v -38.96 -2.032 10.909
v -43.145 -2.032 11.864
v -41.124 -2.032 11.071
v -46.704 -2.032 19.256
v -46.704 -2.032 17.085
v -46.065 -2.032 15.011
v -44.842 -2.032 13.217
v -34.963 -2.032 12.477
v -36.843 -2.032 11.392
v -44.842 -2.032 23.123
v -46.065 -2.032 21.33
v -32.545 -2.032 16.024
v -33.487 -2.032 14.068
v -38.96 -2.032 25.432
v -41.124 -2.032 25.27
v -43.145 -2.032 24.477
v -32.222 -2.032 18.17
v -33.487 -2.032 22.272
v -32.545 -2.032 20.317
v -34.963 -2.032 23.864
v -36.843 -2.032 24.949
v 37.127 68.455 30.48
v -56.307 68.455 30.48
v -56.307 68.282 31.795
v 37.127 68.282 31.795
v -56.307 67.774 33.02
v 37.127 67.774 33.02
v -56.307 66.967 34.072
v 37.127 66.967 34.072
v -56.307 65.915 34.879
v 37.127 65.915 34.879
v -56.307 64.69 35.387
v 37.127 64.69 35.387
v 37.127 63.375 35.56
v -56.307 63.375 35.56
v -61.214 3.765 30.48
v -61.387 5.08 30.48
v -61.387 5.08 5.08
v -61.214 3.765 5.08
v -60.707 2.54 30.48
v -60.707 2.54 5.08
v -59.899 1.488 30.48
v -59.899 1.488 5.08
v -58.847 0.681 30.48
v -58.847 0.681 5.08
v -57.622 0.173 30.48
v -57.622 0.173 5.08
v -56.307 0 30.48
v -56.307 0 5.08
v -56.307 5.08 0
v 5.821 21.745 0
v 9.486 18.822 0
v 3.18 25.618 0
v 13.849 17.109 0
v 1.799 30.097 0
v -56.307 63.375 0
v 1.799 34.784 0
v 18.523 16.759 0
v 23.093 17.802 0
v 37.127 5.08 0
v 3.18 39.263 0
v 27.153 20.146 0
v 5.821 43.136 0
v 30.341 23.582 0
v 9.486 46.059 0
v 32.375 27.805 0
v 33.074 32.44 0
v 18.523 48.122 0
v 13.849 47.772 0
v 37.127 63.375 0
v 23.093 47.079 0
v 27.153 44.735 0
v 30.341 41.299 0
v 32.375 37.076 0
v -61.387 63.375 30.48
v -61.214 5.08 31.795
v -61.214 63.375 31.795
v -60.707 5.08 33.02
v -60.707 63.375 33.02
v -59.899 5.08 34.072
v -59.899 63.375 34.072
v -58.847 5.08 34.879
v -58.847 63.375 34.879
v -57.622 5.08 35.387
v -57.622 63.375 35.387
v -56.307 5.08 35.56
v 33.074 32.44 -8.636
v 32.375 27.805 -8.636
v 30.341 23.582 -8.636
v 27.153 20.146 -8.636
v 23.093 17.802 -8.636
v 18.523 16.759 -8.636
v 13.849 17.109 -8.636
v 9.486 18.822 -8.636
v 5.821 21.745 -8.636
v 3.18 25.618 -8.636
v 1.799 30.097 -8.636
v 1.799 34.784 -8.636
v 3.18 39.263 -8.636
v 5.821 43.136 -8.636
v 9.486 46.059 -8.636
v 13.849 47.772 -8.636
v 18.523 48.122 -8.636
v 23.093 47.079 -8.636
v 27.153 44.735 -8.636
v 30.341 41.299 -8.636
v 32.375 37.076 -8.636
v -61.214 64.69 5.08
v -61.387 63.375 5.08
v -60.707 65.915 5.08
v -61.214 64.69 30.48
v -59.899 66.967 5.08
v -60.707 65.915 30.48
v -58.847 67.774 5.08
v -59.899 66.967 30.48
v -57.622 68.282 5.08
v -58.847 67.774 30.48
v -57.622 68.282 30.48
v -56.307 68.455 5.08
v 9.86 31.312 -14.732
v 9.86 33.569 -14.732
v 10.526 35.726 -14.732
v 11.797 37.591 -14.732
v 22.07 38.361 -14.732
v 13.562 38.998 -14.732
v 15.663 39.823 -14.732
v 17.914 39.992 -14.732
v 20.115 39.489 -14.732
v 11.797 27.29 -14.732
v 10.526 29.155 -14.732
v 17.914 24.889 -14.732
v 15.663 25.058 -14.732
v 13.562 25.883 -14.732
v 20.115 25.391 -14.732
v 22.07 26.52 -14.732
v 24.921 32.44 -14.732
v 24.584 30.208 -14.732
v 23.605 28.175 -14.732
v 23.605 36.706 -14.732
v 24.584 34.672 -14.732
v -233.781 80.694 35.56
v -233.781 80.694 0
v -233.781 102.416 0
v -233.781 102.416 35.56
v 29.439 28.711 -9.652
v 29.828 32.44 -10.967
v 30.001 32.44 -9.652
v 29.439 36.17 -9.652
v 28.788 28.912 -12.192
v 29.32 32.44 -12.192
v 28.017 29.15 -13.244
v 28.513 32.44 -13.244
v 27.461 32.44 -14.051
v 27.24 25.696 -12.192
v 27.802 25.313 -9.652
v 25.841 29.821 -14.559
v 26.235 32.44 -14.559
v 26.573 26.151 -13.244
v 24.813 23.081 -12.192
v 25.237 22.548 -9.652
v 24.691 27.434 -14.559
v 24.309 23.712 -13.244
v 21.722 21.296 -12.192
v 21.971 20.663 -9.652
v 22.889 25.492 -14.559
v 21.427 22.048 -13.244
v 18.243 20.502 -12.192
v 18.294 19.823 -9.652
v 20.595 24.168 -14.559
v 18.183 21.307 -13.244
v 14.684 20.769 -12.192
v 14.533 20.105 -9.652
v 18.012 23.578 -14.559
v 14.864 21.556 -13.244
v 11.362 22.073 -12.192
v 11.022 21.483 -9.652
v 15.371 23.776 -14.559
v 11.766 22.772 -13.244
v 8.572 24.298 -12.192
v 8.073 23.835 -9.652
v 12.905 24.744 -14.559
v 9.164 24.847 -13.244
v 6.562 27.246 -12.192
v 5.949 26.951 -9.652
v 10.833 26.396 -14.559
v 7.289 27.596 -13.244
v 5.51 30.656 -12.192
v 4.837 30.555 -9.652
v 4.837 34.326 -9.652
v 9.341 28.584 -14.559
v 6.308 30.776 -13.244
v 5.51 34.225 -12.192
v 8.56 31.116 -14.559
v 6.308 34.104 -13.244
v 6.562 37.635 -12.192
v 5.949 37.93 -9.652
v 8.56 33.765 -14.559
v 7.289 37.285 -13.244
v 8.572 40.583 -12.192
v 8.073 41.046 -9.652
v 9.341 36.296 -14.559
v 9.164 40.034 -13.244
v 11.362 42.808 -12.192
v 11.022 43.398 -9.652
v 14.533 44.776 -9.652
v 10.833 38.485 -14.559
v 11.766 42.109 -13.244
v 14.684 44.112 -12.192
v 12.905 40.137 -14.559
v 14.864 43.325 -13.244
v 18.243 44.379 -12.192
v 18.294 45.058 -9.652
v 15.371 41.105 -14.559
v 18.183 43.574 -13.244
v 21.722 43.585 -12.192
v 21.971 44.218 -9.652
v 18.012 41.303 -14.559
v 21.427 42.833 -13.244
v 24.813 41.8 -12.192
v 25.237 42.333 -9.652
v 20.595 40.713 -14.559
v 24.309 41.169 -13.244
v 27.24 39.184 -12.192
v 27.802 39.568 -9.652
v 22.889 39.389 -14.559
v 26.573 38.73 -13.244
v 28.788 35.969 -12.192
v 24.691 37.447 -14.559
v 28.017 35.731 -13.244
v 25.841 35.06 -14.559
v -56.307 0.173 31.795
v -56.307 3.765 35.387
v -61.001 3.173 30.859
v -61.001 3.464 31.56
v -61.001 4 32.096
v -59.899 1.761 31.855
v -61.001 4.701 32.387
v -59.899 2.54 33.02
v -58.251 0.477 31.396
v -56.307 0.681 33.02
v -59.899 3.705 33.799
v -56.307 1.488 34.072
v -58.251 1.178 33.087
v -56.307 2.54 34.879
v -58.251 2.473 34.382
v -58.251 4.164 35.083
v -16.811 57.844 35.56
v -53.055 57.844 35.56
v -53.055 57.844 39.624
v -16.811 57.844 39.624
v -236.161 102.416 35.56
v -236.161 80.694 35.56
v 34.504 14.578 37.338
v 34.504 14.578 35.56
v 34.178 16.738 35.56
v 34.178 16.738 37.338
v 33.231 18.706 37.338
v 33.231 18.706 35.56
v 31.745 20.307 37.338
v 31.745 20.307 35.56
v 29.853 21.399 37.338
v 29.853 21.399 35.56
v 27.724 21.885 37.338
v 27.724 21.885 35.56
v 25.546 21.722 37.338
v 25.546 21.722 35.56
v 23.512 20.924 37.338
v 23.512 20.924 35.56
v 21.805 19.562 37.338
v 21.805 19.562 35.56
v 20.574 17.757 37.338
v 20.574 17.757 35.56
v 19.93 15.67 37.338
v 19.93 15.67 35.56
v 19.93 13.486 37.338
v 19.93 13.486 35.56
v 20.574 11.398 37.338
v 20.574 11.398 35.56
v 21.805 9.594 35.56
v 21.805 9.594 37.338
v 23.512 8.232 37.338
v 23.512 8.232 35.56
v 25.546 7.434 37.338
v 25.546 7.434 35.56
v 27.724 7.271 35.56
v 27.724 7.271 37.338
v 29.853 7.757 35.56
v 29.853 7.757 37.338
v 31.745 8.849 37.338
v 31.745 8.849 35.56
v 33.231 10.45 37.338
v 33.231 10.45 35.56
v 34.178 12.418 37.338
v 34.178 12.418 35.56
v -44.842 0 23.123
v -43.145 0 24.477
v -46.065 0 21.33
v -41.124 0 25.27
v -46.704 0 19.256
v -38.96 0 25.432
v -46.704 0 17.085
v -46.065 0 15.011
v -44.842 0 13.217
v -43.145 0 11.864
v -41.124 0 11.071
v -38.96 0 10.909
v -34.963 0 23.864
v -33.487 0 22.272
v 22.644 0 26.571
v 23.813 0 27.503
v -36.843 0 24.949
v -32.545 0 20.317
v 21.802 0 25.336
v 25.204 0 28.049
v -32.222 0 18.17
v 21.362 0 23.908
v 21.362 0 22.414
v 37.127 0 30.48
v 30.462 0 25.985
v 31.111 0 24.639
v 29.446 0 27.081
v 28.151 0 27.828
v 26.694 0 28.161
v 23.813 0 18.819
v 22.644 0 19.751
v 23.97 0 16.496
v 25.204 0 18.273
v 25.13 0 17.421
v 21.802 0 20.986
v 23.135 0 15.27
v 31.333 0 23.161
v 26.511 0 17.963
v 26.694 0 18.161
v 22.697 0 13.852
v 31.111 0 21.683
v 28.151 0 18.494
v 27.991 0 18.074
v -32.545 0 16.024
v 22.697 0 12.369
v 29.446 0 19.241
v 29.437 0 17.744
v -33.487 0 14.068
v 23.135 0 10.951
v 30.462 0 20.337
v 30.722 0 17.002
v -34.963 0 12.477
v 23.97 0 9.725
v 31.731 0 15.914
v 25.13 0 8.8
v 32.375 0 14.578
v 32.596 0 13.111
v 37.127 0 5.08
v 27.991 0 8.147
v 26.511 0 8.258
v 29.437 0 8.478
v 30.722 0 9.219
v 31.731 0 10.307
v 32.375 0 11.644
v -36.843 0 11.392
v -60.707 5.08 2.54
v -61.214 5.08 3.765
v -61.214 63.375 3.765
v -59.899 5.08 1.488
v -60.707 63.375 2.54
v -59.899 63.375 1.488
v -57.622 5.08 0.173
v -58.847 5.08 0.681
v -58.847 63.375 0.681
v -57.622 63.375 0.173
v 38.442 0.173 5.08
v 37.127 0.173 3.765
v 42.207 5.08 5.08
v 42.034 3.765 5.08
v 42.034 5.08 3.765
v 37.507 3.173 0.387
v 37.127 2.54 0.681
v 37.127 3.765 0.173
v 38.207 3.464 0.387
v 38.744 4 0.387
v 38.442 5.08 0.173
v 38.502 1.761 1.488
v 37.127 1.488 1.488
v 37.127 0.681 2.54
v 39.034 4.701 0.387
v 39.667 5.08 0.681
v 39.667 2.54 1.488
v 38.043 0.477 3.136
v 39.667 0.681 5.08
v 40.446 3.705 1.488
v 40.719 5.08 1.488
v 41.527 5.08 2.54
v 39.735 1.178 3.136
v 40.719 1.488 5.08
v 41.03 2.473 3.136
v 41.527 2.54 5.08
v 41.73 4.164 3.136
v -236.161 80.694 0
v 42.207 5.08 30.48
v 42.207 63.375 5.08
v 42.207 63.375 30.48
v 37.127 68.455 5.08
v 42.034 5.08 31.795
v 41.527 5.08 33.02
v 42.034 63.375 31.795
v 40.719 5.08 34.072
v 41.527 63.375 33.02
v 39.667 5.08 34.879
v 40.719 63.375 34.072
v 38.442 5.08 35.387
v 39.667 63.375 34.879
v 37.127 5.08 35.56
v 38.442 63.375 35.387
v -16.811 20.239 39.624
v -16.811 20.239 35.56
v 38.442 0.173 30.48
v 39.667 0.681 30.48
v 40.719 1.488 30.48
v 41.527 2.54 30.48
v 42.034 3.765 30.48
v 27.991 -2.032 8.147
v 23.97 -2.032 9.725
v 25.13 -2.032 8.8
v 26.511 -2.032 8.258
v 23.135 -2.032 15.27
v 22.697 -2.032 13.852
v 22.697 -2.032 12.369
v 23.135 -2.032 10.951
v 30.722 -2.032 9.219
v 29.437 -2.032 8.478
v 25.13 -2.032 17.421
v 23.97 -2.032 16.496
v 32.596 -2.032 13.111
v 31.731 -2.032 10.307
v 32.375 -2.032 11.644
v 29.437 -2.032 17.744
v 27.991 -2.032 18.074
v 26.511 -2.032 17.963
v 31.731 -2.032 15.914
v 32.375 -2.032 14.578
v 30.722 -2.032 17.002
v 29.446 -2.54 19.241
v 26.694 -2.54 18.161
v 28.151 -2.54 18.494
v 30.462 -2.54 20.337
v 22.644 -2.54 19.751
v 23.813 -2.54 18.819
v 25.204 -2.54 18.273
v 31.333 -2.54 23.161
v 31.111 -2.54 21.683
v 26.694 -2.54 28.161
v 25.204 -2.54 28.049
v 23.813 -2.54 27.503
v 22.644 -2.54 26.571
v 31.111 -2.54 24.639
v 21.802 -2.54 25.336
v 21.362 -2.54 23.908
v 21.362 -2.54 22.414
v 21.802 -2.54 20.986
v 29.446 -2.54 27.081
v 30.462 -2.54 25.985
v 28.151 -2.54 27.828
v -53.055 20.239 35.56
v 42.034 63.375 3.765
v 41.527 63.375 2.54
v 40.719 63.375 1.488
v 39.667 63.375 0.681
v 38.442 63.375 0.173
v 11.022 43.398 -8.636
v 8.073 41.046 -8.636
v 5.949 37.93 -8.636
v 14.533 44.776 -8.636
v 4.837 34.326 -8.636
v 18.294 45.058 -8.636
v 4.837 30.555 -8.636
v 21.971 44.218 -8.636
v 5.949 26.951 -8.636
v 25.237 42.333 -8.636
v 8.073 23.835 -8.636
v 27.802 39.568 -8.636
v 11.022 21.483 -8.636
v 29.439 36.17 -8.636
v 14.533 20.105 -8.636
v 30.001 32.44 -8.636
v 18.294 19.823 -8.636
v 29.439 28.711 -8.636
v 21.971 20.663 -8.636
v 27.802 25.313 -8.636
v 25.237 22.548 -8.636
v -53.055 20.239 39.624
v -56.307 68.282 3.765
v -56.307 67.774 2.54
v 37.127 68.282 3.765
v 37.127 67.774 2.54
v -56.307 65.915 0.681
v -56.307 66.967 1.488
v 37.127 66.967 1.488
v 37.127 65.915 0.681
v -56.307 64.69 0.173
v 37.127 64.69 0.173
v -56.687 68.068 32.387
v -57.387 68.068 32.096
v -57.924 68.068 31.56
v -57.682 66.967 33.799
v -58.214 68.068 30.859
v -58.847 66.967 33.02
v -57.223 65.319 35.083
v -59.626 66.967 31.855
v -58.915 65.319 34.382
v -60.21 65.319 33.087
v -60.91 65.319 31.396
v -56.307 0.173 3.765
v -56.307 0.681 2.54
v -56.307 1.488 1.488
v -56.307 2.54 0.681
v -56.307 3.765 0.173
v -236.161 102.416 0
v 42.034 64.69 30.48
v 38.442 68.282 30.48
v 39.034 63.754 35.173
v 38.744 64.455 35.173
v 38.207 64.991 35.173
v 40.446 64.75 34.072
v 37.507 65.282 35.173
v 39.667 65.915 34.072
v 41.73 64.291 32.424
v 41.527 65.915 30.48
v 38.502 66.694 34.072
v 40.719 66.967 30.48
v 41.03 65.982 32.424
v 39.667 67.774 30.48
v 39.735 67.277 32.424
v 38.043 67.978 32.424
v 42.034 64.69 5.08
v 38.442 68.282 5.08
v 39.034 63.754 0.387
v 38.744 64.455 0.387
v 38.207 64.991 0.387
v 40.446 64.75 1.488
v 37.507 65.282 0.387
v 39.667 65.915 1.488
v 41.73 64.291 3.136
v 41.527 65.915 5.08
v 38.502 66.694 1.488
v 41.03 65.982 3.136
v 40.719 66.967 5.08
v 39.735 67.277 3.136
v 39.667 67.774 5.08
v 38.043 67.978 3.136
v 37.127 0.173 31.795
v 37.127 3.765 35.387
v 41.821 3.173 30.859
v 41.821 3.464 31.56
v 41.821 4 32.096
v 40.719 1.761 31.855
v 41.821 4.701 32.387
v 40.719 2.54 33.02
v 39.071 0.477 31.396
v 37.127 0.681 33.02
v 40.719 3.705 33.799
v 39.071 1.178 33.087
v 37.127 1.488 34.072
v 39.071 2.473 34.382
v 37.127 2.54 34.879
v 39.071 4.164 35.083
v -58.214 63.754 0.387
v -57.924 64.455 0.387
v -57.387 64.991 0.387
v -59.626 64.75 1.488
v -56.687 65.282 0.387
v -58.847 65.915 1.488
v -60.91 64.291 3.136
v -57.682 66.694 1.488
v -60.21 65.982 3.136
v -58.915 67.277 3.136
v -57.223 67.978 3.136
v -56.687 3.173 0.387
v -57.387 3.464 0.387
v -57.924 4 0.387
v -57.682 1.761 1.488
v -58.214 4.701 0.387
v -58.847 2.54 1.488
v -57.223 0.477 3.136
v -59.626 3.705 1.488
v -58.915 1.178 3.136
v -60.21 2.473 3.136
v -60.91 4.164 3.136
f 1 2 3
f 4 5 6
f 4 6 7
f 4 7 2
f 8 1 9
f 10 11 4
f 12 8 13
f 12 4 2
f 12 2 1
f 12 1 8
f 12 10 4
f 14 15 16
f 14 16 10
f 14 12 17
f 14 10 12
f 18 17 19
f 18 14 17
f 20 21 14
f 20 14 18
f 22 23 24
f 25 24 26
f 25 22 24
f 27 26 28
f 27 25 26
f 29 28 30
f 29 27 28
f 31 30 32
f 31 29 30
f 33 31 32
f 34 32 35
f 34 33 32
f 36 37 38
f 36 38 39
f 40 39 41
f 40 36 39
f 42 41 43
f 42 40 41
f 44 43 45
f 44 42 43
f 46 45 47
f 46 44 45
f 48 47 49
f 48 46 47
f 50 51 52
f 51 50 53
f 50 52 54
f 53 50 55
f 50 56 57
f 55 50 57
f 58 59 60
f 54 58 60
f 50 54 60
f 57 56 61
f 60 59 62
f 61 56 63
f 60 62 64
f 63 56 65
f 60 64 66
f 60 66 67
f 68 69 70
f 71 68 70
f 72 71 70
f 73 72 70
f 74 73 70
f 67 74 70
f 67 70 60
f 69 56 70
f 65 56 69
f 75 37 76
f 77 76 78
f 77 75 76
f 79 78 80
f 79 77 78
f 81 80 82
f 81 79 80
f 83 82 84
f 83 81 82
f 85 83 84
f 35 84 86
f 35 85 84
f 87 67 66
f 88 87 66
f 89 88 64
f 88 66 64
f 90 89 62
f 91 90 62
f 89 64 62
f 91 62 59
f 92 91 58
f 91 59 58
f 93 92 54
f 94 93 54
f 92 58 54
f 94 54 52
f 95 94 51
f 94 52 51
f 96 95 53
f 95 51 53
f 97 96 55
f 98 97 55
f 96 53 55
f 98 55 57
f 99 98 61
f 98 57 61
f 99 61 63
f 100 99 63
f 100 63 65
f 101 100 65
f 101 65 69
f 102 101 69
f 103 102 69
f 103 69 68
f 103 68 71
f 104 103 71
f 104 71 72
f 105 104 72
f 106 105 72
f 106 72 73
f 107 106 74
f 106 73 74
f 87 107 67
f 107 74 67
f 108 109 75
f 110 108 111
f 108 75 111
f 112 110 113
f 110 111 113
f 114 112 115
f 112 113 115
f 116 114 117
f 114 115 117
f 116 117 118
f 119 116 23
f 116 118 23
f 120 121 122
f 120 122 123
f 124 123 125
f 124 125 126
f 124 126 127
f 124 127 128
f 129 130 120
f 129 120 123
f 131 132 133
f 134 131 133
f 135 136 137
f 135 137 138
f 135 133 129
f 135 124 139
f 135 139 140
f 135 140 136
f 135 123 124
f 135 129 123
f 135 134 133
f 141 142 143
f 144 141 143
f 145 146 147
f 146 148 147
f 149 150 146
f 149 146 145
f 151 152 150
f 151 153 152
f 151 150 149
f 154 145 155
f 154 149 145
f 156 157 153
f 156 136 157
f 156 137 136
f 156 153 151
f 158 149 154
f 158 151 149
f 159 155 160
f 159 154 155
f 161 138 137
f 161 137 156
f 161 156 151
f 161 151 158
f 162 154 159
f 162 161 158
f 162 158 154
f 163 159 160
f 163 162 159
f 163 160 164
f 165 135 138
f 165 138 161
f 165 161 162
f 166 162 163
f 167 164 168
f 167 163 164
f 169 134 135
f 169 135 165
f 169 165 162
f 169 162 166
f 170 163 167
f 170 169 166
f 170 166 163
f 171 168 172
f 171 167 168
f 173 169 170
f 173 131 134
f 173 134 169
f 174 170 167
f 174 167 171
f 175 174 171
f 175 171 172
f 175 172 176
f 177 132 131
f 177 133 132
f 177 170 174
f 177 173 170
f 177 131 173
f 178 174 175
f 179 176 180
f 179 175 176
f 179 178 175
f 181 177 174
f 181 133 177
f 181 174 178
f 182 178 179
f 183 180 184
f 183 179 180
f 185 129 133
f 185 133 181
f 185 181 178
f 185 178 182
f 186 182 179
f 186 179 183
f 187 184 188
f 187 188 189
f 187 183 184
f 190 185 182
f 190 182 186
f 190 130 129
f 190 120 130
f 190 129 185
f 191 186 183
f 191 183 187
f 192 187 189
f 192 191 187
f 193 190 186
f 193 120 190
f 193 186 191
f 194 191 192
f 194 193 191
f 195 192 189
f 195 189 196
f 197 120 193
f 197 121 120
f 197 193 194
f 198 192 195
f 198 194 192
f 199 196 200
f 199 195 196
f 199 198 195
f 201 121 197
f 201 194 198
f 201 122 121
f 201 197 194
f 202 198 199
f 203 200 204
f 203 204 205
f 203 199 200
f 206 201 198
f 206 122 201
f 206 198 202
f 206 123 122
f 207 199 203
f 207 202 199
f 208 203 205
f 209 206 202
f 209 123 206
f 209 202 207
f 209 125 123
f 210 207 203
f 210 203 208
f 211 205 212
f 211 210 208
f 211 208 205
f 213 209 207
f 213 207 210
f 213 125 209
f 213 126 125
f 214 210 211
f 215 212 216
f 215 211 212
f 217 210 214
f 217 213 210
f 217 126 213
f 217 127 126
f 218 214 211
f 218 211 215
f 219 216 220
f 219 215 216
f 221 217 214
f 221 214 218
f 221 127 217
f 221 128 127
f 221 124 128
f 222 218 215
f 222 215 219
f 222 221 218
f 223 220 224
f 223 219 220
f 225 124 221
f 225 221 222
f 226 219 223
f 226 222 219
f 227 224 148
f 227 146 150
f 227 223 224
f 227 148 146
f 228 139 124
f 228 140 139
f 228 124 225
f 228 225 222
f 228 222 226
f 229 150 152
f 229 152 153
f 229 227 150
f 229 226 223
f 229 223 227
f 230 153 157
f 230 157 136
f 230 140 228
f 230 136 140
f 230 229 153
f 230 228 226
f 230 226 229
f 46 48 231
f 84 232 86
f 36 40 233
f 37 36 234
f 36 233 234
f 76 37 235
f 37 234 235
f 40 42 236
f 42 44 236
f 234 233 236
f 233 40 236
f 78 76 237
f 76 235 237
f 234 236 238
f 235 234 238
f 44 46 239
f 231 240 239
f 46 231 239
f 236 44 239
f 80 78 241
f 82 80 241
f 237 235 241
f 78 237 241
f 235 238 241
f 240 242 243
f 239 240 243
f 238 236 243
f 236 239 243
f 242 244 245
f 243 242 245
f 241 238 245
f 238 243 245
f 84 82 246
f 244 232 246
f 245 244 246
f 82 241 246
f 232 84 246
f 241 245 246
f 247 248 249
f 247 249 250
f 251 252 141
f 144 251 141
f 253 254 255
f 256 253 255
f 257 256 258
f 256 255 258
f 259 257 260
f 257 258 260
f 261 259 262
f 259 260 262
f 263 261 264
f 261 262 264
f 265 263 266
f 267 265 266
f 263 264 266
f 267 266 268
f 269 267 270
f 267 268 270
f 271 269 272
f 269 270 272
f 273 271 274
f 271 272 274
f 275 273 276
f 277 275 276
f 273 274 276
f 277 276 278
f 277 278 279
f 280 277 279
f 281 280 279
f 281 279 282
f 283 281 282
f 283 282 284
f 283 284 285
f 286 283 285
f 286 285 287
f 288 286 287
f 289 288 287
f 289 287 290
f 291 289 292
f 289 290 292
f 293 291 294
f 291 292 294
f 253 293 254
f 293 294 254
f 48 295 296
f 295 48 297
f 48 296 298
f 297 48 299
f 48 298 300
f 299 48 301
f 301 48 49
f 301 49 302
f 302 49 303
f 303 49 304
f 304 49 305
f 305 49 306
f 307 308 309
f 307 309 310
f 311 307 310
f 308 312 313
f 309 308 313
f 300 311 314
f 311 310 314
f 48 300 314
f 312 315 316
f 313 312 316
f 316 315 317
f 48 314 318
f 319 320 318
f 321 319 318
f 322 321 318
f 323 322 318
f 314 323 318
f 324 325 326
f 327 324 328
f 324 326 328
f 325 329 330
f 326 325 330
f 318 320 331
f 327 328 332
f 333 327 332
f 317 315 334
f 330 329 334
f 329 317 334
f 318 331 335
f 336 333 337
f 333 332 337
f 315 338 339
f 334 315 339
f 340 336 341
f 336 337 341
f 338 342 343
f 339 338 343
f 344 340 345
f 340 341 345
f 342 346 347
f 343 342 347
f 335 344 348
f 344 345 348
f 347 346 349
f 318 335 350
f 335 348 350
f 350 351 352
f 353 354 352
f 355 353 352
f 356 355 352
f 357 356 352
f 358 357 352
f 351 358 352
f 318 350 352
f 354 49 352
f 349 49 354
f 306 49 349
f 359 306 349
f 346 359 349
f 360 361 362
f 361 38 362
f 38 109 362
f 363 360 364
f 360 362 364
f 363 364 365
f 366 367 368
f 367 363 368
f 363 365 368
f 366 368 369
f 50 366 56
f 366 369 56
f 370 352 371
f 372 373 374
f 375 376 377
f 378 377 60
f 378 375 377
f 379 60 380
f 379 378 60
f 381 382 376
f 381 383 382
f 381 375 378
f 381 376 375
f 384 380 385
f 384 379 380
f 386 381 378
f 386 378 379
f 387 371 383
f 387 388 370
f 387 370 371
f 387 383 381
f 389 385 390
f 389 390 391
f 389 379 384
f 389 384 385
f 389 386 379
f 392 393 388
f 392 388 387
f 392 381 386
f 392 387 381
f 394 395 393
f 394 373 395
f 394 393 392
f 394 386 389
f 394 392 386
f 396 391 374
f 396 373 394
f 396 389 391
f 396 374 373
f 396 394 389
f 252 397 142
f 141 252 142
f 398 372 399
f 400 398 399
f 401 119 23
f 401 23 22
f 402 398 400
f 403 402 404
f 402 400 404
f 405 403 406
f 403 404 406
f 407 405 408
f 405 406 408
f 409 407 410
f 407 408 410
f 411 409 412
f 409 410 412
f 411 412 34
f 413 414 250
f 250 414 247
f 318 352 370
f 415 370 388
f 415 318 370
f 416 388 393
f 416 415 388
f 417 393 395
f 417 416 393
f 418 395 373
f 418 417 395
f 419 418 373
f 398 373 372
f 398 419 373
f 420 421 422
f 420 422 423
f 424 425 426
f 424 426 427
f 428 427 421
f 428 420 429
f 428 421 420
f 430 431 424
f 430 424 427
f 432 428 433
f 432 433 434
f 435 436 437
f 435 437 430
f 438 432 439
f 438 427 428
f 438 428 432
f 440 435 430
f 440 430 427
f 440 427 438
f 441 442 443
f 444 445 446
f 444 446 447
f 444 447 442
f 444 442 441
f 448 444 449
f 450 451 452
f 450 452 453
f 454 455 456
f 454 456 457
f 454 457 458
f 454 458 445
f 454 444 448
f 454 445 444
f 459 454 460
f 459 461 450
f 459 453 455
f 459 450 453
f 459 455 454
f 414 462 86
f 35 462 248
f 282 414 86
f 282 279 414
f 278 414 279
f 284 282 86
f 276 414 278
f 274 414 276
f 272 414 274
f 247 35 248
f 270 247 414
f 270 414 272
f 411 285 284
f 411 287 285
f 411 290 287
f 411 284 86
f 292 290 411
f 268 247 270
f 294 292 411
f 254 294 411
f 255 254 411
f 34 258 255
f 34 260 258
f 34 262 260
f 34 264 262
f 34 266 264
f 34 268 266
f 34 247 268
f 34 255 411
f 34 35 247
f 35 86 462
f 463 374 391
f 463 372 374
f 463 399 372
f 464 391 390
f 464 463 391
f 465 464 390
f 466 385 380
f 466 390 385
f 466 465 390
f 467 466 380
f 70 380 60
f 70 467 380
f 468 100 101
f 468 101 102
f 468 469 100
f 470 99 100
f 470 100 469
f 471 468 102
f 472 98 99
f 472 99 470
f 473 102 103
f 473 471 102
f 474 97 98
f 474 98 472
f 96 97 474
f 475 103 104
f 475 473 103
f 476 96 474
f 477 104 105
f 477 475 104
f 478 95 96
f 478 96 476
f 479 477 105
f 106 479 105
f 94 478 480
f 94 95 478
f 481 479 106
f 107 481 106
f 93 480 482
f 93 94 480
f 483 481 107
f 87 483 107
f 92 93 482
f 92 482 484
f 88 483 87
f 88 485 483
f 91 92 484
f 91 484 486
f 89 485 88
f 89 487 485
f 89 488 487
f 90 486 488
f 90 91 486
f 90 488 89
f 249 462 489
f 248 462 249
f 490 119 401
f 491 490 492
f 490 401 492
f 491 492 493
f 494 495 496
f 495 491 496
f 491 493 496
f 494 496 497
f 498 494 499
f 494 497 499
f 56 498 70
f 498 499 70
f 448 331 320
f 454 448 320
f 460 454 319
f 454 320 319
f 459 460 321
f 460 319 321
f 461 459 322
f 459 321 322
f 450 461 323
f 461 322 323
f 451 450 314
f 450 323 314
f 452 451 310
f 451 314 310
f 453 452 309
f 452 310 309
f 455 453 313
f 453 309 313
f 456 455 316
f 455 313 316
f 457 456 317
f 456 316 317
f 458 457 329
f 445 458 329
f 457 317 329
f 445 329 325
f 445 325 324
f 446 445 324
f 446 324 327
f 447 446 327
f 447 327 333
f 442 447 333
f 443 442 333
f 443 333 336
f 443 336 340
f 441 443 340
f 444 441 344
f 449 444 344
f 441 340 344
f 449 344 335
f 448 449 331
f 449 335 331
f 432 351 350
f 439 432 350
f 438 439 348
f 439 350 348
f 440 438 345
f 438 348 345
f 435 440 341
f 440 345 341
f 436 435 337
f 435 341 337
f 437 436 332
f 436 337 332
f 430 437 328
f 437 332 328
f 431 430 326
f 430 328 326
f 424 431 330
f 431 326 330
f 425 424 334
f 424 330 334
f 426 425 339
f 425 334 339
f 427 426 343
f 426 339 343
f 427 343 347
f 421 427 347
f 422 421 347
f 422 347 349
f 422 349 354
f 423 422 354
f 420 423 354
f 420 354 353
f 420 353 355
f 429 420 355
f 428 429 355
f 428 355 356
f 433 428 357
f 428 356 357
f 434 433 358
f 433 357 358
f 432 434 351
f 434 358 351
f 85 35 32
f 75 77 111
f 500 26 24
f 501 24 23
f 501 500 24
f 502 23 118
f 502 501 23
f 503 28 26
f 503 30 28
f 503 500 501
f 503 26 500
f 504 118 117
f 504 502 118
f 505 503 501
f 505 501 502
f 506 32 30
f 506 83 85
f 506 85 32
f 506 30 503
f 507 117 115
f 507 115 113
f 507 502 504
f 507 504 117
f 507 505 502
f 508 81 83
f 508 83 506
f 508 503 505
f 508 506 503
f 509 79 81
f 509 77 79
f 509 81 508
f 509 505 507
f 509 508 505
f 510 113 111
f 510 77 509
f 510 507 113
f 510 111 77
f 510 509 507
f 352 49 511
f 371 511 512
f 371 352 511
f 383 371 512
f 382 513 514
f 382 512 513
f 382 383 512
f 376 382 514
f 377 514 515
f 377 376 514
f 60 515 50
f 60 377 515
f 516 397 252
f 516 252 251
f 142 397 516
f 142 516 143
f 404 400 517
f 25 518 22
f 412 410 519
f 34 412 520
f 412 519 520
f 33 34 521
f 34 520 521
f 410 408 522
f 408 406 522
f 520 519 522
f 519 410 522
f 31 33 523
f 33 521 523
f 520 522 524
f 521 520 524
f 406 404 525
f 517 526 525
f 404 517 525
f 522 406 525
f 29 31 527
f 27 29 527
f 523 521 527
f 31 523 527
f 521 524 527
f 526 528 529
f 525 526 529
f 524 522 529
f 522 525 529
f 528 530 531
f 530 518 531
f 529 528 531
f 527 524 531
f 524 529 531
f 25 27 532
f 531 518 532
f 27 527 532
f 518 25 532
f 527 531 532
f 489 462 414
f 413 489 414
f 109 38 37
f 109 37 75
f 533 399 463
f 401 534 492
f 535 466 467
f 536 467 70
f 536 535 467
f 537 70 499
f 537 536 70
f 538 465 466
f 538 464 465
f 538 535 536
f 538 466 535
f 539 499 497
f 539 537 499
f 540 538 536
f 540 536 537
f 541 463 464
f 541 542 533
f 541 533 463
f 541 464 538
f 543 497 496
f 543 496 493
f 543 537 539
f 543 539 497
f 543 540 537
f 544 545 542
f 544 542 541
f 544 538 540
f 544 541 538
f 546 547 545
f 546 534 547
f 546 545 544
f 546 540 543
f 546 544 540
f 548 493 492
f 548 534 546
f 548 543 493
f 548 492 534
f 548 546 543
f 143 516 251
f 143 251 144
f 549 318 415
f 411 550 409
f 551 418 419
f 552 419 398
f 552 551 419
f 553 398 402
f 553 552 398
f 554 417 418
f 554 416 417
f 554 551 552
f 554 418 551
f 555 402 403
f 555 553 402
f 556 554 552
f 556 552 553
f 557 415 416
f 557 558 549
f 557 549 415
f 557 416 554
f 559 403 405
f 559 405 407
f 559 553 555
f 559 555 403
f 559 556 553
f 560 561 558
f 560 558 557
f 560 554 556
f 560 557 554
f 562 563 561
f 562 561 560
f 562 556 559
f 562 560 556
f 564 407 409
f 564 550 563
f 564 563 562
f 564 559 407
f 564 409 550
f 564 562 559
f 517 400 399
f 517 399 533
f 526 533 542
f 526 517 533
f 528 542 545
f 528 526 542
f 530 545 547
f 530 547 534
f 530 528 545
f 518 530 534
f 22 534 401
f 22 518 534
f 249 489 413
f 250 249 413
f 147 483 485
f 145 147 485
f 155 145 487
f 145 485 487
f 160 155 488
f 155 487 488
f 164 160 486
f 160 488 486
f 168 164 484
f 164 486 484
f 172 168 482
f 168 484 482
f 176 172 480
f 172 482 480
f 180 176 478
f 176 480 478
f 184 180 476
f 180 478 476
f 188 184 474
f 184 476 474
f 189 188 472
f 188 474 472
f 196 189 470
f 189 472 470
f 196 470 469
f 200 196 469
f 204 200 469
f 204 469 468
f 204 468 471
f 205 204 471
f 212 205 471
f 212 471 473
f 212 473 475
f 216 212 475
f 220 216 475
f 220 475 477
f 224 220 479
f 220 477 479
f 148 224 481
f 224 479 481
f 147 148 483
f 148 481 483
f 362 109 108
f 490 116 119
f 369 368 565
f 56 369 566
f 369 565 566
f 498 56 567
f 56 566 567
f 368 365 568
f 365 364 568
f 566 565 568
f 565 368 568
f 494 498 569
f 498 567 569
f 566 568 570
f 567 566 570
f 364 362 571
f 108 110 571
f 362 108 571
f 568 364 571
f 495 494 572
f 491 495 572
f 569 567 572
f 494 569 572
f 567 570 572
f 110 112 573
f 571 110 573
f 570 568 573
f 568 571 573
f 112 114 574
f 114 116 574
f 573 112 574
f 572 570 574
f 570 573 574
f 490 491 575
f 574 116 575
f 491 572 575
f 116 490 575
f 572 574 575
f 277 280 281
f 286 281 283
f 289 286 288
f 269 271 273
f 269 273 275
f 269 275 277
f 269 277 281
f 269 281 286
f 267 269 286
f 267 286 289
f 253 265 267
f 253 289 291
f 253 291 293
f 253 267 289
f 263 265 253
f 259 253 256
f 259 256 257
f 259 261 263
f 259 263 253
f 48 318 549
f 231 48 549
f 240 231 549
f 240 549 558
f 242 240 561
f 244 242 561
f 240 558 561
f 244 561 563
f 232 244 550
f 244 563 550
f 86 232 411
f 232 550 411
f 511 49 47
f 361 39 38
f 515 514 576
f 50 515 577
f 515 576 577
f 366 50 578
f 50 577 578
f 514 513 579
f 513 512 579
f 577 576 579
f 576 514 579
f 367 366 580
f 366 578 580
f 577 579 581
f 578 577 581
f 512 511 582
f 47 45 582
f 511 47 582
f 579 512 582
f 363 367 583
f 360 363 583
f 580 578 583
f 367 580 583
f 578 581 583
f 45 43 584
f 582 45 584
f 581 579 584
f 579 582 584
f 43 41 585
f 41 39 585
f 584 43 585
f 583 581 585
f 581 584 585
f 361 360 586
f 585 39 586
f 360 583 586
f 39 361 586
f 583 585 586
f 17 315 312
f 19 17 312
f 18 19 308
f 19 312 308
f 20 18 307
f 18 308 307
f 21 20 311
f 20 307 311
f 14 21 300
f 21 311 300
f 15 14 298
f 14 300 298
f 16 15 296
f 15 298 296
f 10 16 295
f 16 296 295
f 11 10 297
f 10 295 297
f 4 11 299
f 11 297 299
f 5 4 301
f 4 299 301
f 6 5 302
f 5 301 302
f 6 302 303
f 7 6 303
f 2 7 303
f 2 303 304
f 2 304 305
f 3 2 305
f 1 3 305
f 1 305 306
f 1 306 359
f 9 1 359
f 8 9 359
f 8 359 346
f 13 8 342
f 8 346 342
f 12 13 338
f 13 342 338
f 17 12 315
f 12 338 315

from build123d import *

# Parameters (mm, degrees)
F0_W      = 103.594608
F0_H      = 68.454988
F0_W_2    = 2.380431
F0_H_2    = 21.722003
F1_DEPTH  = 35.56
F2_R      = 5.08
F3_R      = 15.725324
F4_DEPTH  = 8.636
F5_R      = 12.652435
F6_DEPTH  = 6.096
F7_R      = 5.08
F8_W      = 36.244502
F8_H      = 37.605167
F9_DEPTH  = 4.064
F10_R     = 7.282007
F11_DEPTH = 2.032
F12_R     = 4.977168
F13_DEPTH = 2.032
F14_R     = 5.013773
F15_DEPTH = 2.54
F16_R     = 7.327619
F17_DEPTH = 1.778


with BuildPart() as f1:
    # F0 (on Top) → F1 (new body)
    with BuildSketch(Plane.XY):
        with Locations((-9.590026, 34.227494)):
            Rectangle(F0_W, F0_H)
        with Locations((-234.970912, 91.555051)):
            Rectangle(F0_W_2, F0_H_2)
    extrude(amount=F1_DEPTH)

    # F2
    f2_edges = [f1.edges().sort_by_distance(p)[0] for p in [
        (-9.590026, 0, 35.56),
        (-61.38733, 0, 17.78),
        (42.207278, 0, 17.78),
        (-9.590026, 0, 0),
        (42.207278, 68.454988, 17.78),
        (42.207278, 34.227494, 0),
        (42.207278, 34.227494, 35.56),
        (-61.38733, 34.227494, 35.56),
        (-9.590026, 68.454988, 35.56),
        (-61.38733, 68.454988, 17.78),
        (-61.38733, 34.227494, 0),
        (-9.590026, 68.454988, 0),
    ]]
    fillet(f2_edges, radius=F2_R)

    # F3 (on face) → F4 (join)
    with BuildSketch(Plane(origin=(0, 0, 0), x_dir=(1, 0, 0), z_dir=(0, 0, -1))):
        with Locations((17.34825, -32.440465)):
            Circle(F3_R)
    extrude(amount=F4_DEPTH)

    # F5 (on face) → F6 (join)
    with BuildSketch(Plane(origin=(0, 0, -8.636), x_dir=(1, 0, 0), z_dir=(0, 0, -1))):
        with Locations((17.34825, -32.440465)):
            Circle(F5_R)
    extrude(amount=F6_DEPTH)

    # F7
    f7_edges = [f1.edges().sort_by_distance(p)[0] for p in [
        (4.695815, 32.440465, -14.732),
    ]]
    fillet(f7_edges, radius=F7_R)

    # F8 (on face) → F9 (join)
    with BuildSketch(Plane.XY.offset(35.56)):
        with Locations((-34.933013, 39.04146)):
            Rectangle(F8_W, F8_H)
    extrude(amount=F9_DEPTH)

    # F10 (on face) → F11 (join)
    with BuildSketch(Plane.XZ):
        with Locations((-39.503742, 18.17023)):
            Circle(F10_R)
    extrude(amount=F11_DEPTH)

    # F12 (on face) → F13 (join)
    with BuildSketch(Plane.XZ):
        with Locations((27.618997, 13.110625)):
            Circle(F12_R)
    extrude(amount=F13_DEPTH)

    # F14 (on face) → F15 (join)
    with BuildSketch(Plane.XZ):
        with Locations((26.319608, 23.16107)):
            Circle(F14_R)
    extrude(amount=F15_DEPTH)

    # F16 (on face) → F17 (join)
    with BuildSketch(Plane.XY.offset(35.56)):
        with Locations((27.176181, 14.577762)):
            Circle(F16_R)
    extrude(amount=F17_DEPTH)


solid = f1.part
